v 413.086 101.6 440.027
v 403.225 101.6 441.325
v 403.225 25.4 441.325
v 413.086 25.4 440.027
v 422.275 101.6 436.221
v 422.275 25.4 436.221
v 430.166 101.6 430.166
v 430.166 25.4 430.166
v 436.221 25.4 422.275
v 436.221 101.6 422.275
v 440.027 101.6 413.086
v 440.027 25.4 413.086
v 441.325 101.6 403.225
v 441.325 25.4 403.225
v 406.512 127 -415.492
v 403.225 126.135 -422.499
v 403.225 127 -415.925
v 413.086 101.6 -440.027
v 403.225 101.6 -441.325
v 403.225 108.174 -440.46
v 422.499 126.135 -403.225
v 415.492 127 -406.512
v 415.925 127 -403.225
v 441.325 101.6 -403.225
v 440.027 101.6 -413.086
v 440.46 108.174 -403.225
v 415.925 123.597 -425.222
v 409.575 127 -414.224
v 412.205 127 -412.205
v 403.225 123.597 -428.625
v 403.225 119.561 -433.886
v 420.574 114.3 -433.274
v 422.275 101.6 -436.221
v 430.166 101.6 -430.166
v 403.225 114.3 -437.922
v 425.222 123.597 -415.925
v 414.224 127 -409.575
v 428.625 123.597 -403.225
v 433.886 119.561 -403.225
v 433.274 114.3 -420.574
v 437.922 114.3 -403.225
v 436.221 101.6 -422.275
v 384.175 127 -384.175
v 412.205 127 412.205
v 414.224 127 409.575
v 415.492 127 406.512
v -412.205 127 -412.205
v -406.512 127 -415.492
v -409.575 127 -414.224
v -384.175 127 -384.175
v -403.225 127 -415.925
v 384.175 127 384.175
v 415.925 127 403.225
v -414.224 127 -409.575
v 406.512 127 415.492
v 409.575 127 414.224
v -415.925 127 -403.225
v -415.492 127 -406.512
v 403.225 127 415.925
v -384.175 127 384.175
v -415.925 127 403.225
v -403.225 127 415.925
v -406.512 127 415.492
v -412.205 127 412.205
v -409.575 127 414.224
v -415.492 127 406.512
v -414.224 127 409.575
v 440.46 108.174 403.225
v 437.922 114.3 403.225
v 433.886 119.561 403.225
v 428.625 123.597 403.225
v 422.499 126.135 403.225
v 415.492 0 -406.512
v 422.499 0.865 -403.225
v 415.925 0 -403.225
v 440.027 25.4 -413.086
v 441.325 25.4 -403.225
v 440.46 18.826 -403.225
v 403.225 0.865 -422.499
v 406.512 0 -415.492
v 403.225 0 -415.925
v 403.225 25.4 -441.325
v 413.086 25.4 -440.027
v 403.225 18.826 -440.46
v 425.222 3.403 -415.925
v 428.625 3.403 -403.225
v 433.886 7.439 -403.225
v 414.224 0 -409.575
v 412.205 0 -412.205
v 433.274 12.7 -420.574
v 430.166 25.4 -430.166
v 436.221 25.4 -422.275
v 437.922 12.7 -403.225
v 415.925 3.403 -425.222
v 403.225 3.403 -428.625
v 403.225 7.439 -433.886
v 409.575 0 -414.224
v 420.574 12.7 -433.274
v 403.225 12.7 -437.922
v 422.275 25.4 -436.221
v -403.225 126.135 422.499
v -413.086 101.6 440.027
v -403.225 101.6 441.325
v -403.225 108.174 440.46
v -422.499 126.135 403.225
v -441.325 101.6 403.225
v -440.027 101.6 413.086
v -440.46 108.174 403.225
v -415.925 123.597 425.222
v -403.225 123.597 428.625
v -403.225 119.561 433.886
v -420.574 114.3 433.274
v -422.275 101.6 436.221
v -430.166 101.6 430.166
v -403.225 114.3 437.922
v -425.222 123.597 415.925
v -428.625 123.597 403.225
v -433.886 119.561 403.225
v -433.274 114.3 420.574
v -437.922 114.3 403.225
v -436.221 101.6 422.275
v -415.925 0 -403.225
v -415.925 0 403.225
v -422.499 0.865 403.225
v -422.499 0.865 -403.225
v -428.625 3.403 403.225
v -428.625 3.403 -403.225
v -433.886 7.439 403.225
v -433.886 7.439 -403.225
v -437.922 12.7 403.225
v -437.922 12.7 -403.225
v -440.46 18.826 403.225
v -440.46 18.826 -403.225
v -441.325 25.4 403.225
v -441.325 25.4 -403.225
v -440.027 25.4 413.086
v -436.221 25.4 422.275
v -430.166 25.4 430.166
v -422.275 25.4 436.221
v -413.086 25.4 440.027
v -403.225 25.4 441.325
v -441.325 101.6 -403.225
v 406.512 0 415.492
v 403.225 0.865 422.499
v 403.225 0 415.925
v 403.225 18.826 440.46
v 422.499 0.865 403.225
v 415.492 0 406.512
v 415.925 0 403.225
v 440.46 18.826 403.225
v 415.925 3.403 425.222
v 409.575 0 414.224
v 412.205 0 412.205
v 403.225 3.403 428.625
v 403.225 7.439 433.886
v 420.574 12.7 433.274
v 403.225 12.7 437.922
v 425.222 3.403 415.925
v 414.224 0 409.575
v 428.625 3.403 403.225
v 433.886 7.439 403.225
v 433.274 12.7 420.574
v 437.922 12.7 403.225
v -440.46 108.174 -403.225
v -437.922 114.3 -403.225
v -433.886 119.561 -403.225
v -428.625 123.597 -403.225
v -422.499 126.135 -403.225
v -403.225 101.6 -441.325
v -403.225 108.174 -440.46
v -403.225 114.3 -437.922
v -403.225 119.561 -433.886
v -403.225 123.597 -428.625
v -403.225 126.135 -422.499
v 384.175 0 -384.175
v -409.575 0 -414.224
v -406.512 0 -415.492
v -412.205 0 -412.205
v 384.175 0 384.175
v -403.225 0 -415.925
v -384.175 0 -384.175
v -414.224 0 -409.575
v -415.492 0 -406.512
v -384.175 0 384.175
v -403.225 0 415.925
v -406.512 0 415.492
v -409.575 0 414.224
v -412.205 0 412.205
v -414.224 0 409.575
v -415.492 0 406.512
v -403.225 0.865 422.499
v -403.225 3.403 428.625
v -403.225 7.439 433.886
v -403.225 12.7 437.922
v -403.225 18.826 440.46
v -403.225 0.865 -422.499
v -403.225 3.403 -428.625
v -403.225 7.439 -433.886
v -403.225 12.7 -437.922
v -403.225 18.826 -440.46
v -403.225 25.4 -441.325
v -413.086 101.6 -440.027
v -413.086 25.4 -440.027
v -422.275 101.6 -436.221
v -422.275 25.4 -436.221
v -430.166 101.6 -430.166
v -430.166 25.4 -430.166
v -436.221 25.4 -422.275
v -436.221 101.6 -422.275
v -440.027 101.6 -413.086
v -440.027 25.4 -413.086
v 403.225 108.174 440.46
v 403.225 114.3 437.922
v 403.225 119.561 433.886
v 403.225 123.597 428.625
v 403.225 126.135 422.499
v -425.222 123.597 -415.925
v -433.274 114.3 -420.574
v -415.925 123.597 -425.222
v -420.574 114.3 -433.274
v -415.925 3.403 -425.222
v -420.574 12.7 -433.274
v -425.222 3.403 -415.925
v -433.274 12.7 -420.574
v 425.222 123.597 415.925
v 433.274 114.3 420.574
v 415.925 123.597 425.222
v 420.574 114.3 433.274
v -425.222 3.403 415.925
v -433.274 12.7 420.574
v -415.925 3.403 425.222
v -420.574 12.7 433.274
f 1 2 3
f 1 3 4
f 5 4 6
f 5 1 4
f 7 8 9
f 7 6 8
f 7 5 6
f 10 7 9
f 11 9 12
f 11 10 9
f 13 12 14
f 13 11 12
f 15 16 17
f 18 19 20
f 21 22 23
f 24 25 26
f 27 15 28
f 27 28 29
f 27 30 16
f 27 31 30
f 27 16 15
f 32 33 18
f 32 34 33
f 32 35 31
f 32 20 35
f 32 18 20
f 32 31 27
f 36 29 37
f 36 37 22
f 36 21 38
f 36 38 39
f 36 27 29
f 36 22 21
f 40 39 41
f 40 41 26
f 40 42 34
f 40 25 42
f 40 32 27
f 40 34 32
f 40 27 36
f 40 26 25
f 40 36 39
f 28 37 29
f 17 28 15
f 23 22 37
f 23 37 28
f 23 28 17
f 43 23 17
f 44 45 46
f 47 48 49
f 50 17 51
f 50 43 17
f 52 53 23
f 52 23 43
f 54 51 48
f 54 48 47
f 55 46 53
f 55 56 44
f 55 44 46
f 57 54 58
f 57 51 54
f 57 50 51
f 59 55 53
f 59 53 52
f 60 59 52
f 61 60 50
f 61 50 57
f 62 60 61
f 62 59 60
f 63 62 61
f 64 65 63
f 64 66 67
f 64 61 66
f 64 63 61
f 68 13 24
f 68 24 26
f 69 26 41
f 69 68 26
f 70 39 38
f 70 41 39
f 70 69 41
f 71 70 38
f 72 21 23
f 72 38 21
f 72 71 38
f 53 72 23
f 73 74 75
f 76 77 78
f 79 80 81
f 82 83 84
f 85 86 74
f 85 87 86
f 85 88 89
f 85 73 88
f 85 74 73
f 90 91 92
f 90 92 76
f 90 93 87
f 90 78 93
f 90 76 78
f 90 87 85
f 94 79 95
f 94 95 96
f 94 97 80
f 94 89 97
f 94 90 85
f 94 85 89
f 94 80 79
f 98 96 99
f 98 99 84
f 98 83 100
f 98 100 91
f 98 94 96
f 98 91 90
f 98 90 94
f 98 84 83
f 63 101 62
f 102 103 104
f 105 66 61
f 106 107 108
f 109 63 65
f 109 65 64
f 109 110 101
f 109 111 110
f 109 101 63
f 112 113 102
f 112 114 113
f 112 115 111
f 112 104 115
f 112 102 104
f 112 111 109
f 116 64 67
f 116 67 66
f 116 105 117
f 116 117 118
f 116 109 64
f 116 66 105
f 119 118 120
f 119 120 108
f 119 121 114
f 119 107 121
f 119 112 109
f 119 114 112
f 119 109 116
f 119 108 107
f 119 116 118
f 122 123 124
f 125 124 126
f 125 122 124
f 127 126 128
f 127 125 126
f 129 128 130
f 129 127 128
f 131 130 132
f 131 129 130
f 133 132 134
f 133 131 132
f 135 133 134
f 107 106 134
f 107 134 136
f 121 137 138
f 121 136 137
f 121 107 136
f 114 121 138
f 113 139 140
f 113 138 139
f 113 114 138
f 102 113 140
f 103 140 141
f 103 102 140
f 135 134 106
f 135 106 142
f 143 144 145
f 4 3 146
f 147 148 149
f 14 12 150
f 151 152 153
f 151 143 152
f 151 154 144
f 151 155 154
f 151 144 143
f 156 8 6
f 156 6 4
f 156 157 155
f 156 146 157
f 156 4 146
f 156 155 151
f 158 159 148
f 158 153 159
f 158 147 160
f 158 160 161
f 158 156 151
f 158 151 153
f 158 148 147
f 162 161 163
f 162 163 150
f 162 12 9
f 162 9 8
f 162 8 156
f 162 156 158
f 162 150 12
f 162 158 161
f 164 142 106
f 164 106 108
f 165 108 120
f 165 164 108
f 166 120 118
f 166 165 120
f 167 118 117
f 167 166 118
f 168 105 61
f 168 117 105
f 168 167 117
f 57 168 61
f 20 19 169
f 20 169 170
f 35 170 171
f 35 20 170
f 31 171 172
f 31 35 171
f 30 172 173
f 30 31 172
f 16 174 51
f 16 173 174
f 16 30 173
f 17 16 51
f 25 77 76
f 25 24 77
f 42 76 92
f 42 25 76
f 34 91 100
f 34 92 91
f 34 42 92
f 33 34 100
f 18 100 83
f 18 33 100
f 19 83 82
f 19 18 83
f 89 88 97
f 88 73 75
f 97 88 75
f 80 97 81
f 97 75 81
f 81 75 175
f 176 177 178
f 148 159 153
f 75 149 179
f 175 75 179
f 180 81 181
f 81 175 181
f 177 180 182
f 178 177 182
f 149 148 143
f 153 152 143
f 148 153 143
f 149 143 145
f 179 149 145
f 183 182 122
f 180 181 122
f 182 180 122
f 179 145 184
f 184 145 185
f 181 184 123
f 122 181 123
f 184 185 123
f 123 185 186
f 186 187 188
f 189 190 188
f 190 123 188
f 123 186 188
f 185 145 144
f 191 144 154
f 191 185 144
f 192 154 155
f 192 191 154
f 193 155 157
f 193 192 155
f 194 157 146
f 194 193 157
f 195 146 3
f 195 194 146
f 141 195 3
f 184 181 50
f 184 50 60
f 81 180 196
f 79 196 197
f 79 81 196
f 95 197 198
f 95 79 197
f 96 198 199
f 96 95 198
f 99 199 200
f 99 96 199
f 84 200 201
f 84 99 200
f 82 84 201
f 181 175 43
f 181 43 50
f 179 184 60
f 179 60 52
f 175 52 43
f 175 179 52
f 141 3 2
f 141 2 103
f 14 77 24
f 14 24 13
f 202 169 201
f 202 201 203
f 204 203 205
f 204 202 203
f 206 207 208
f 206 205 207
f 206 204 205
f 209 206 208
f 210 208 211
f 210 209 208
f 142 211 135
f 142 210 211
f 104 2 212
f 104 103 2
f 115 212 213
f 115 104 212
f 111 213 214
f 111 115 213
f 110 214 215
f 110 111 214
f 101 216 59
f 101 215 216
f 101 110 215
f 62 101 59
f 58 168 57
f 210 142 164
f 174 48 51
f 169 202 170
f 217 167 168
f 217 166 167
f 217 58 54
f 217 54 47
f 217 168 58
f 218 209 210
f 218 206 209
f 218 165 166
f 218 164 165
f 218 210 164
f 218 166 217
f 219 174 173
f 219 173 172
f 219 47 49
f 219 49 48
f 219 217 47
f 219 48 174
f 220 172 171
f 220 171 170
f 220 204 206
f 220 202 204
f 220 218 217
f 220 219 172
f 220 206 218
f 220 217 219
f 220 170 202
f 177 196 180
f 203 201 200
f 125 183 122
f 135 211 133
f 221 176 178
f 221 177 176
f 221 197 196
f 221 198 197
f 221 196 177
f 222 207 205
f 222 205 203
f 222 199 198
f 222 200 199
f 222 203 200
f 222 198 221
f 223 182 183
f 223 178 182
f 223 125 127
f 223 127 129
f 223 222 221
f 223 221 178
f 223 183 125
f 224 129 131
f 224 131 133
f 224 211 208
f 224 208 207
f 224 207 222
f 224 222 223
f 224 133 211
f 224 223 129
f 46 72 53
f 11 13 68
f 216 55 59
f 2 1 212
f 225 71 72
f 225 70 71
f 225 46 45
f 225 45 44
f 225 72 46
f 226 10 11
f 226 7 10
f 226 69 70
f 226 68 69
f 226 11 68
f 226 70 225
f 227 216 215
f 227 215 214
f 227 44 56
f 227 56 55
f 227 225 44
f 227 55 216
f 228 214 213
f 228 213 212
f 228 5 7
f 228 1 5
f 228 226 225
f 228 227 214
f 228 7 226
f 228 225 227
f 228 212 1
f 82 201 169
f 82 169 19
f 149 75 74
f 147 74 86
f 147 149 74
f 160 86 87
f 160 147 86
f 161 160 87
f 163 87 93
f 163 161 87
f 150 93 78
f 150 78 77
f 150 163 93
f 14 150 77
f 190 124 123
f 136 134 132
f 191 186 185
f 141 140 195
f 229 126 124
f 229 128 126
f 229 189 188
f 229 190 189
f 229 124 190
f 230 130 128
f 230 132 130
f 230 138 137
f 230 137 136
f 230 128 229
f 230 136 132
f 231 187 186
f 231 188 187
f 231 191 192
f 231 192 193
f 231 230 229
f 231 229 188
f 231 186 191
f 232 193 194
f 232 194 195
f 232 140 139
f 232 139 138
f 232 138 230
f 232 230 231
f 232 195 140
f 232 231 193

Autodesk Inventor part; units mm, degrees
ref_plane "YZ Plane" through (0, 0, 0) normal (1, 0, 0) x (0, 1, 0)
ref_plane "XZ Plane" through (0, 0, 0) normal (0, 1, 0) x (-1, 0, 0)
ref_plane "XY Plane" through (0, 0, 0) normal (0, 0, 1) x (1, 0, 0)
sketch "Sketch1" plane through (0, 0, 0) normal (0, 1, 0) x (-1, 0, 0)
  line L0 (-384.175, -384.175) -> (384.175, -384.175)
  line L1 (384.175, -384.175) -> (384.175, 384.175)
  line L2 (384.175, 384.175) -> (-384.175, 384.175)
  line L3 (-384.175, 384.175) -> (-384.175, -384.175)
  line L4 (-384.175, -384.175) -> (384.175, 384.175) construction
  line L5 (384.175, -384.175) -> (-384.175, 384.175) construction
  line L6 (441.325, 441.325) -> (441.325, -441.325)
  line L7 (441.325, -441.325) -> (-441.325, -441.325)
  line L8 (-441.325, -441.325) -> (-441.325, 441.325)
  line L9 (-441.325, 441.325) -> (441.325, 441.325)
  point P0 (0, 0)
  dimension "d0" = 768.35
  dimension "d1" = 768.35
  dimension "d2" = 57.15
extrude "Extrusion1" add sketch "Sketch1" along normal blind 127
fillet "Fillet1" radius 38.1 4 edges at (-441.325, 63.5, 441.325) (441.325, 63.5, 441.325) (441.325, 63.5, -441.325) (-441.325, 63.5, -441.325)
fillet "Fillet2" radius 25.4 16 edges at (430.1658, 127, 430.1658) (441.325, 127, 0) (430.1658, 127, -430.1658) (0, 127, -441.325) (-430.1658, 127, -430.1658) (-441.325, 127, 0) (-430.1658, 127, 430.1658) (0, 127, 441.325) (430.1658, 0, 430.1658) (441.325, 0, 0) (430.1658, 0, -430.1658) (0, 0, -441.325) (-430.1658, 0, -430.1658) (-441.325, 0, 0) (-430.1658, 0, 430.1658) (0, 0, 441.325)
properties part number "BP-0036" material "Fabric"
